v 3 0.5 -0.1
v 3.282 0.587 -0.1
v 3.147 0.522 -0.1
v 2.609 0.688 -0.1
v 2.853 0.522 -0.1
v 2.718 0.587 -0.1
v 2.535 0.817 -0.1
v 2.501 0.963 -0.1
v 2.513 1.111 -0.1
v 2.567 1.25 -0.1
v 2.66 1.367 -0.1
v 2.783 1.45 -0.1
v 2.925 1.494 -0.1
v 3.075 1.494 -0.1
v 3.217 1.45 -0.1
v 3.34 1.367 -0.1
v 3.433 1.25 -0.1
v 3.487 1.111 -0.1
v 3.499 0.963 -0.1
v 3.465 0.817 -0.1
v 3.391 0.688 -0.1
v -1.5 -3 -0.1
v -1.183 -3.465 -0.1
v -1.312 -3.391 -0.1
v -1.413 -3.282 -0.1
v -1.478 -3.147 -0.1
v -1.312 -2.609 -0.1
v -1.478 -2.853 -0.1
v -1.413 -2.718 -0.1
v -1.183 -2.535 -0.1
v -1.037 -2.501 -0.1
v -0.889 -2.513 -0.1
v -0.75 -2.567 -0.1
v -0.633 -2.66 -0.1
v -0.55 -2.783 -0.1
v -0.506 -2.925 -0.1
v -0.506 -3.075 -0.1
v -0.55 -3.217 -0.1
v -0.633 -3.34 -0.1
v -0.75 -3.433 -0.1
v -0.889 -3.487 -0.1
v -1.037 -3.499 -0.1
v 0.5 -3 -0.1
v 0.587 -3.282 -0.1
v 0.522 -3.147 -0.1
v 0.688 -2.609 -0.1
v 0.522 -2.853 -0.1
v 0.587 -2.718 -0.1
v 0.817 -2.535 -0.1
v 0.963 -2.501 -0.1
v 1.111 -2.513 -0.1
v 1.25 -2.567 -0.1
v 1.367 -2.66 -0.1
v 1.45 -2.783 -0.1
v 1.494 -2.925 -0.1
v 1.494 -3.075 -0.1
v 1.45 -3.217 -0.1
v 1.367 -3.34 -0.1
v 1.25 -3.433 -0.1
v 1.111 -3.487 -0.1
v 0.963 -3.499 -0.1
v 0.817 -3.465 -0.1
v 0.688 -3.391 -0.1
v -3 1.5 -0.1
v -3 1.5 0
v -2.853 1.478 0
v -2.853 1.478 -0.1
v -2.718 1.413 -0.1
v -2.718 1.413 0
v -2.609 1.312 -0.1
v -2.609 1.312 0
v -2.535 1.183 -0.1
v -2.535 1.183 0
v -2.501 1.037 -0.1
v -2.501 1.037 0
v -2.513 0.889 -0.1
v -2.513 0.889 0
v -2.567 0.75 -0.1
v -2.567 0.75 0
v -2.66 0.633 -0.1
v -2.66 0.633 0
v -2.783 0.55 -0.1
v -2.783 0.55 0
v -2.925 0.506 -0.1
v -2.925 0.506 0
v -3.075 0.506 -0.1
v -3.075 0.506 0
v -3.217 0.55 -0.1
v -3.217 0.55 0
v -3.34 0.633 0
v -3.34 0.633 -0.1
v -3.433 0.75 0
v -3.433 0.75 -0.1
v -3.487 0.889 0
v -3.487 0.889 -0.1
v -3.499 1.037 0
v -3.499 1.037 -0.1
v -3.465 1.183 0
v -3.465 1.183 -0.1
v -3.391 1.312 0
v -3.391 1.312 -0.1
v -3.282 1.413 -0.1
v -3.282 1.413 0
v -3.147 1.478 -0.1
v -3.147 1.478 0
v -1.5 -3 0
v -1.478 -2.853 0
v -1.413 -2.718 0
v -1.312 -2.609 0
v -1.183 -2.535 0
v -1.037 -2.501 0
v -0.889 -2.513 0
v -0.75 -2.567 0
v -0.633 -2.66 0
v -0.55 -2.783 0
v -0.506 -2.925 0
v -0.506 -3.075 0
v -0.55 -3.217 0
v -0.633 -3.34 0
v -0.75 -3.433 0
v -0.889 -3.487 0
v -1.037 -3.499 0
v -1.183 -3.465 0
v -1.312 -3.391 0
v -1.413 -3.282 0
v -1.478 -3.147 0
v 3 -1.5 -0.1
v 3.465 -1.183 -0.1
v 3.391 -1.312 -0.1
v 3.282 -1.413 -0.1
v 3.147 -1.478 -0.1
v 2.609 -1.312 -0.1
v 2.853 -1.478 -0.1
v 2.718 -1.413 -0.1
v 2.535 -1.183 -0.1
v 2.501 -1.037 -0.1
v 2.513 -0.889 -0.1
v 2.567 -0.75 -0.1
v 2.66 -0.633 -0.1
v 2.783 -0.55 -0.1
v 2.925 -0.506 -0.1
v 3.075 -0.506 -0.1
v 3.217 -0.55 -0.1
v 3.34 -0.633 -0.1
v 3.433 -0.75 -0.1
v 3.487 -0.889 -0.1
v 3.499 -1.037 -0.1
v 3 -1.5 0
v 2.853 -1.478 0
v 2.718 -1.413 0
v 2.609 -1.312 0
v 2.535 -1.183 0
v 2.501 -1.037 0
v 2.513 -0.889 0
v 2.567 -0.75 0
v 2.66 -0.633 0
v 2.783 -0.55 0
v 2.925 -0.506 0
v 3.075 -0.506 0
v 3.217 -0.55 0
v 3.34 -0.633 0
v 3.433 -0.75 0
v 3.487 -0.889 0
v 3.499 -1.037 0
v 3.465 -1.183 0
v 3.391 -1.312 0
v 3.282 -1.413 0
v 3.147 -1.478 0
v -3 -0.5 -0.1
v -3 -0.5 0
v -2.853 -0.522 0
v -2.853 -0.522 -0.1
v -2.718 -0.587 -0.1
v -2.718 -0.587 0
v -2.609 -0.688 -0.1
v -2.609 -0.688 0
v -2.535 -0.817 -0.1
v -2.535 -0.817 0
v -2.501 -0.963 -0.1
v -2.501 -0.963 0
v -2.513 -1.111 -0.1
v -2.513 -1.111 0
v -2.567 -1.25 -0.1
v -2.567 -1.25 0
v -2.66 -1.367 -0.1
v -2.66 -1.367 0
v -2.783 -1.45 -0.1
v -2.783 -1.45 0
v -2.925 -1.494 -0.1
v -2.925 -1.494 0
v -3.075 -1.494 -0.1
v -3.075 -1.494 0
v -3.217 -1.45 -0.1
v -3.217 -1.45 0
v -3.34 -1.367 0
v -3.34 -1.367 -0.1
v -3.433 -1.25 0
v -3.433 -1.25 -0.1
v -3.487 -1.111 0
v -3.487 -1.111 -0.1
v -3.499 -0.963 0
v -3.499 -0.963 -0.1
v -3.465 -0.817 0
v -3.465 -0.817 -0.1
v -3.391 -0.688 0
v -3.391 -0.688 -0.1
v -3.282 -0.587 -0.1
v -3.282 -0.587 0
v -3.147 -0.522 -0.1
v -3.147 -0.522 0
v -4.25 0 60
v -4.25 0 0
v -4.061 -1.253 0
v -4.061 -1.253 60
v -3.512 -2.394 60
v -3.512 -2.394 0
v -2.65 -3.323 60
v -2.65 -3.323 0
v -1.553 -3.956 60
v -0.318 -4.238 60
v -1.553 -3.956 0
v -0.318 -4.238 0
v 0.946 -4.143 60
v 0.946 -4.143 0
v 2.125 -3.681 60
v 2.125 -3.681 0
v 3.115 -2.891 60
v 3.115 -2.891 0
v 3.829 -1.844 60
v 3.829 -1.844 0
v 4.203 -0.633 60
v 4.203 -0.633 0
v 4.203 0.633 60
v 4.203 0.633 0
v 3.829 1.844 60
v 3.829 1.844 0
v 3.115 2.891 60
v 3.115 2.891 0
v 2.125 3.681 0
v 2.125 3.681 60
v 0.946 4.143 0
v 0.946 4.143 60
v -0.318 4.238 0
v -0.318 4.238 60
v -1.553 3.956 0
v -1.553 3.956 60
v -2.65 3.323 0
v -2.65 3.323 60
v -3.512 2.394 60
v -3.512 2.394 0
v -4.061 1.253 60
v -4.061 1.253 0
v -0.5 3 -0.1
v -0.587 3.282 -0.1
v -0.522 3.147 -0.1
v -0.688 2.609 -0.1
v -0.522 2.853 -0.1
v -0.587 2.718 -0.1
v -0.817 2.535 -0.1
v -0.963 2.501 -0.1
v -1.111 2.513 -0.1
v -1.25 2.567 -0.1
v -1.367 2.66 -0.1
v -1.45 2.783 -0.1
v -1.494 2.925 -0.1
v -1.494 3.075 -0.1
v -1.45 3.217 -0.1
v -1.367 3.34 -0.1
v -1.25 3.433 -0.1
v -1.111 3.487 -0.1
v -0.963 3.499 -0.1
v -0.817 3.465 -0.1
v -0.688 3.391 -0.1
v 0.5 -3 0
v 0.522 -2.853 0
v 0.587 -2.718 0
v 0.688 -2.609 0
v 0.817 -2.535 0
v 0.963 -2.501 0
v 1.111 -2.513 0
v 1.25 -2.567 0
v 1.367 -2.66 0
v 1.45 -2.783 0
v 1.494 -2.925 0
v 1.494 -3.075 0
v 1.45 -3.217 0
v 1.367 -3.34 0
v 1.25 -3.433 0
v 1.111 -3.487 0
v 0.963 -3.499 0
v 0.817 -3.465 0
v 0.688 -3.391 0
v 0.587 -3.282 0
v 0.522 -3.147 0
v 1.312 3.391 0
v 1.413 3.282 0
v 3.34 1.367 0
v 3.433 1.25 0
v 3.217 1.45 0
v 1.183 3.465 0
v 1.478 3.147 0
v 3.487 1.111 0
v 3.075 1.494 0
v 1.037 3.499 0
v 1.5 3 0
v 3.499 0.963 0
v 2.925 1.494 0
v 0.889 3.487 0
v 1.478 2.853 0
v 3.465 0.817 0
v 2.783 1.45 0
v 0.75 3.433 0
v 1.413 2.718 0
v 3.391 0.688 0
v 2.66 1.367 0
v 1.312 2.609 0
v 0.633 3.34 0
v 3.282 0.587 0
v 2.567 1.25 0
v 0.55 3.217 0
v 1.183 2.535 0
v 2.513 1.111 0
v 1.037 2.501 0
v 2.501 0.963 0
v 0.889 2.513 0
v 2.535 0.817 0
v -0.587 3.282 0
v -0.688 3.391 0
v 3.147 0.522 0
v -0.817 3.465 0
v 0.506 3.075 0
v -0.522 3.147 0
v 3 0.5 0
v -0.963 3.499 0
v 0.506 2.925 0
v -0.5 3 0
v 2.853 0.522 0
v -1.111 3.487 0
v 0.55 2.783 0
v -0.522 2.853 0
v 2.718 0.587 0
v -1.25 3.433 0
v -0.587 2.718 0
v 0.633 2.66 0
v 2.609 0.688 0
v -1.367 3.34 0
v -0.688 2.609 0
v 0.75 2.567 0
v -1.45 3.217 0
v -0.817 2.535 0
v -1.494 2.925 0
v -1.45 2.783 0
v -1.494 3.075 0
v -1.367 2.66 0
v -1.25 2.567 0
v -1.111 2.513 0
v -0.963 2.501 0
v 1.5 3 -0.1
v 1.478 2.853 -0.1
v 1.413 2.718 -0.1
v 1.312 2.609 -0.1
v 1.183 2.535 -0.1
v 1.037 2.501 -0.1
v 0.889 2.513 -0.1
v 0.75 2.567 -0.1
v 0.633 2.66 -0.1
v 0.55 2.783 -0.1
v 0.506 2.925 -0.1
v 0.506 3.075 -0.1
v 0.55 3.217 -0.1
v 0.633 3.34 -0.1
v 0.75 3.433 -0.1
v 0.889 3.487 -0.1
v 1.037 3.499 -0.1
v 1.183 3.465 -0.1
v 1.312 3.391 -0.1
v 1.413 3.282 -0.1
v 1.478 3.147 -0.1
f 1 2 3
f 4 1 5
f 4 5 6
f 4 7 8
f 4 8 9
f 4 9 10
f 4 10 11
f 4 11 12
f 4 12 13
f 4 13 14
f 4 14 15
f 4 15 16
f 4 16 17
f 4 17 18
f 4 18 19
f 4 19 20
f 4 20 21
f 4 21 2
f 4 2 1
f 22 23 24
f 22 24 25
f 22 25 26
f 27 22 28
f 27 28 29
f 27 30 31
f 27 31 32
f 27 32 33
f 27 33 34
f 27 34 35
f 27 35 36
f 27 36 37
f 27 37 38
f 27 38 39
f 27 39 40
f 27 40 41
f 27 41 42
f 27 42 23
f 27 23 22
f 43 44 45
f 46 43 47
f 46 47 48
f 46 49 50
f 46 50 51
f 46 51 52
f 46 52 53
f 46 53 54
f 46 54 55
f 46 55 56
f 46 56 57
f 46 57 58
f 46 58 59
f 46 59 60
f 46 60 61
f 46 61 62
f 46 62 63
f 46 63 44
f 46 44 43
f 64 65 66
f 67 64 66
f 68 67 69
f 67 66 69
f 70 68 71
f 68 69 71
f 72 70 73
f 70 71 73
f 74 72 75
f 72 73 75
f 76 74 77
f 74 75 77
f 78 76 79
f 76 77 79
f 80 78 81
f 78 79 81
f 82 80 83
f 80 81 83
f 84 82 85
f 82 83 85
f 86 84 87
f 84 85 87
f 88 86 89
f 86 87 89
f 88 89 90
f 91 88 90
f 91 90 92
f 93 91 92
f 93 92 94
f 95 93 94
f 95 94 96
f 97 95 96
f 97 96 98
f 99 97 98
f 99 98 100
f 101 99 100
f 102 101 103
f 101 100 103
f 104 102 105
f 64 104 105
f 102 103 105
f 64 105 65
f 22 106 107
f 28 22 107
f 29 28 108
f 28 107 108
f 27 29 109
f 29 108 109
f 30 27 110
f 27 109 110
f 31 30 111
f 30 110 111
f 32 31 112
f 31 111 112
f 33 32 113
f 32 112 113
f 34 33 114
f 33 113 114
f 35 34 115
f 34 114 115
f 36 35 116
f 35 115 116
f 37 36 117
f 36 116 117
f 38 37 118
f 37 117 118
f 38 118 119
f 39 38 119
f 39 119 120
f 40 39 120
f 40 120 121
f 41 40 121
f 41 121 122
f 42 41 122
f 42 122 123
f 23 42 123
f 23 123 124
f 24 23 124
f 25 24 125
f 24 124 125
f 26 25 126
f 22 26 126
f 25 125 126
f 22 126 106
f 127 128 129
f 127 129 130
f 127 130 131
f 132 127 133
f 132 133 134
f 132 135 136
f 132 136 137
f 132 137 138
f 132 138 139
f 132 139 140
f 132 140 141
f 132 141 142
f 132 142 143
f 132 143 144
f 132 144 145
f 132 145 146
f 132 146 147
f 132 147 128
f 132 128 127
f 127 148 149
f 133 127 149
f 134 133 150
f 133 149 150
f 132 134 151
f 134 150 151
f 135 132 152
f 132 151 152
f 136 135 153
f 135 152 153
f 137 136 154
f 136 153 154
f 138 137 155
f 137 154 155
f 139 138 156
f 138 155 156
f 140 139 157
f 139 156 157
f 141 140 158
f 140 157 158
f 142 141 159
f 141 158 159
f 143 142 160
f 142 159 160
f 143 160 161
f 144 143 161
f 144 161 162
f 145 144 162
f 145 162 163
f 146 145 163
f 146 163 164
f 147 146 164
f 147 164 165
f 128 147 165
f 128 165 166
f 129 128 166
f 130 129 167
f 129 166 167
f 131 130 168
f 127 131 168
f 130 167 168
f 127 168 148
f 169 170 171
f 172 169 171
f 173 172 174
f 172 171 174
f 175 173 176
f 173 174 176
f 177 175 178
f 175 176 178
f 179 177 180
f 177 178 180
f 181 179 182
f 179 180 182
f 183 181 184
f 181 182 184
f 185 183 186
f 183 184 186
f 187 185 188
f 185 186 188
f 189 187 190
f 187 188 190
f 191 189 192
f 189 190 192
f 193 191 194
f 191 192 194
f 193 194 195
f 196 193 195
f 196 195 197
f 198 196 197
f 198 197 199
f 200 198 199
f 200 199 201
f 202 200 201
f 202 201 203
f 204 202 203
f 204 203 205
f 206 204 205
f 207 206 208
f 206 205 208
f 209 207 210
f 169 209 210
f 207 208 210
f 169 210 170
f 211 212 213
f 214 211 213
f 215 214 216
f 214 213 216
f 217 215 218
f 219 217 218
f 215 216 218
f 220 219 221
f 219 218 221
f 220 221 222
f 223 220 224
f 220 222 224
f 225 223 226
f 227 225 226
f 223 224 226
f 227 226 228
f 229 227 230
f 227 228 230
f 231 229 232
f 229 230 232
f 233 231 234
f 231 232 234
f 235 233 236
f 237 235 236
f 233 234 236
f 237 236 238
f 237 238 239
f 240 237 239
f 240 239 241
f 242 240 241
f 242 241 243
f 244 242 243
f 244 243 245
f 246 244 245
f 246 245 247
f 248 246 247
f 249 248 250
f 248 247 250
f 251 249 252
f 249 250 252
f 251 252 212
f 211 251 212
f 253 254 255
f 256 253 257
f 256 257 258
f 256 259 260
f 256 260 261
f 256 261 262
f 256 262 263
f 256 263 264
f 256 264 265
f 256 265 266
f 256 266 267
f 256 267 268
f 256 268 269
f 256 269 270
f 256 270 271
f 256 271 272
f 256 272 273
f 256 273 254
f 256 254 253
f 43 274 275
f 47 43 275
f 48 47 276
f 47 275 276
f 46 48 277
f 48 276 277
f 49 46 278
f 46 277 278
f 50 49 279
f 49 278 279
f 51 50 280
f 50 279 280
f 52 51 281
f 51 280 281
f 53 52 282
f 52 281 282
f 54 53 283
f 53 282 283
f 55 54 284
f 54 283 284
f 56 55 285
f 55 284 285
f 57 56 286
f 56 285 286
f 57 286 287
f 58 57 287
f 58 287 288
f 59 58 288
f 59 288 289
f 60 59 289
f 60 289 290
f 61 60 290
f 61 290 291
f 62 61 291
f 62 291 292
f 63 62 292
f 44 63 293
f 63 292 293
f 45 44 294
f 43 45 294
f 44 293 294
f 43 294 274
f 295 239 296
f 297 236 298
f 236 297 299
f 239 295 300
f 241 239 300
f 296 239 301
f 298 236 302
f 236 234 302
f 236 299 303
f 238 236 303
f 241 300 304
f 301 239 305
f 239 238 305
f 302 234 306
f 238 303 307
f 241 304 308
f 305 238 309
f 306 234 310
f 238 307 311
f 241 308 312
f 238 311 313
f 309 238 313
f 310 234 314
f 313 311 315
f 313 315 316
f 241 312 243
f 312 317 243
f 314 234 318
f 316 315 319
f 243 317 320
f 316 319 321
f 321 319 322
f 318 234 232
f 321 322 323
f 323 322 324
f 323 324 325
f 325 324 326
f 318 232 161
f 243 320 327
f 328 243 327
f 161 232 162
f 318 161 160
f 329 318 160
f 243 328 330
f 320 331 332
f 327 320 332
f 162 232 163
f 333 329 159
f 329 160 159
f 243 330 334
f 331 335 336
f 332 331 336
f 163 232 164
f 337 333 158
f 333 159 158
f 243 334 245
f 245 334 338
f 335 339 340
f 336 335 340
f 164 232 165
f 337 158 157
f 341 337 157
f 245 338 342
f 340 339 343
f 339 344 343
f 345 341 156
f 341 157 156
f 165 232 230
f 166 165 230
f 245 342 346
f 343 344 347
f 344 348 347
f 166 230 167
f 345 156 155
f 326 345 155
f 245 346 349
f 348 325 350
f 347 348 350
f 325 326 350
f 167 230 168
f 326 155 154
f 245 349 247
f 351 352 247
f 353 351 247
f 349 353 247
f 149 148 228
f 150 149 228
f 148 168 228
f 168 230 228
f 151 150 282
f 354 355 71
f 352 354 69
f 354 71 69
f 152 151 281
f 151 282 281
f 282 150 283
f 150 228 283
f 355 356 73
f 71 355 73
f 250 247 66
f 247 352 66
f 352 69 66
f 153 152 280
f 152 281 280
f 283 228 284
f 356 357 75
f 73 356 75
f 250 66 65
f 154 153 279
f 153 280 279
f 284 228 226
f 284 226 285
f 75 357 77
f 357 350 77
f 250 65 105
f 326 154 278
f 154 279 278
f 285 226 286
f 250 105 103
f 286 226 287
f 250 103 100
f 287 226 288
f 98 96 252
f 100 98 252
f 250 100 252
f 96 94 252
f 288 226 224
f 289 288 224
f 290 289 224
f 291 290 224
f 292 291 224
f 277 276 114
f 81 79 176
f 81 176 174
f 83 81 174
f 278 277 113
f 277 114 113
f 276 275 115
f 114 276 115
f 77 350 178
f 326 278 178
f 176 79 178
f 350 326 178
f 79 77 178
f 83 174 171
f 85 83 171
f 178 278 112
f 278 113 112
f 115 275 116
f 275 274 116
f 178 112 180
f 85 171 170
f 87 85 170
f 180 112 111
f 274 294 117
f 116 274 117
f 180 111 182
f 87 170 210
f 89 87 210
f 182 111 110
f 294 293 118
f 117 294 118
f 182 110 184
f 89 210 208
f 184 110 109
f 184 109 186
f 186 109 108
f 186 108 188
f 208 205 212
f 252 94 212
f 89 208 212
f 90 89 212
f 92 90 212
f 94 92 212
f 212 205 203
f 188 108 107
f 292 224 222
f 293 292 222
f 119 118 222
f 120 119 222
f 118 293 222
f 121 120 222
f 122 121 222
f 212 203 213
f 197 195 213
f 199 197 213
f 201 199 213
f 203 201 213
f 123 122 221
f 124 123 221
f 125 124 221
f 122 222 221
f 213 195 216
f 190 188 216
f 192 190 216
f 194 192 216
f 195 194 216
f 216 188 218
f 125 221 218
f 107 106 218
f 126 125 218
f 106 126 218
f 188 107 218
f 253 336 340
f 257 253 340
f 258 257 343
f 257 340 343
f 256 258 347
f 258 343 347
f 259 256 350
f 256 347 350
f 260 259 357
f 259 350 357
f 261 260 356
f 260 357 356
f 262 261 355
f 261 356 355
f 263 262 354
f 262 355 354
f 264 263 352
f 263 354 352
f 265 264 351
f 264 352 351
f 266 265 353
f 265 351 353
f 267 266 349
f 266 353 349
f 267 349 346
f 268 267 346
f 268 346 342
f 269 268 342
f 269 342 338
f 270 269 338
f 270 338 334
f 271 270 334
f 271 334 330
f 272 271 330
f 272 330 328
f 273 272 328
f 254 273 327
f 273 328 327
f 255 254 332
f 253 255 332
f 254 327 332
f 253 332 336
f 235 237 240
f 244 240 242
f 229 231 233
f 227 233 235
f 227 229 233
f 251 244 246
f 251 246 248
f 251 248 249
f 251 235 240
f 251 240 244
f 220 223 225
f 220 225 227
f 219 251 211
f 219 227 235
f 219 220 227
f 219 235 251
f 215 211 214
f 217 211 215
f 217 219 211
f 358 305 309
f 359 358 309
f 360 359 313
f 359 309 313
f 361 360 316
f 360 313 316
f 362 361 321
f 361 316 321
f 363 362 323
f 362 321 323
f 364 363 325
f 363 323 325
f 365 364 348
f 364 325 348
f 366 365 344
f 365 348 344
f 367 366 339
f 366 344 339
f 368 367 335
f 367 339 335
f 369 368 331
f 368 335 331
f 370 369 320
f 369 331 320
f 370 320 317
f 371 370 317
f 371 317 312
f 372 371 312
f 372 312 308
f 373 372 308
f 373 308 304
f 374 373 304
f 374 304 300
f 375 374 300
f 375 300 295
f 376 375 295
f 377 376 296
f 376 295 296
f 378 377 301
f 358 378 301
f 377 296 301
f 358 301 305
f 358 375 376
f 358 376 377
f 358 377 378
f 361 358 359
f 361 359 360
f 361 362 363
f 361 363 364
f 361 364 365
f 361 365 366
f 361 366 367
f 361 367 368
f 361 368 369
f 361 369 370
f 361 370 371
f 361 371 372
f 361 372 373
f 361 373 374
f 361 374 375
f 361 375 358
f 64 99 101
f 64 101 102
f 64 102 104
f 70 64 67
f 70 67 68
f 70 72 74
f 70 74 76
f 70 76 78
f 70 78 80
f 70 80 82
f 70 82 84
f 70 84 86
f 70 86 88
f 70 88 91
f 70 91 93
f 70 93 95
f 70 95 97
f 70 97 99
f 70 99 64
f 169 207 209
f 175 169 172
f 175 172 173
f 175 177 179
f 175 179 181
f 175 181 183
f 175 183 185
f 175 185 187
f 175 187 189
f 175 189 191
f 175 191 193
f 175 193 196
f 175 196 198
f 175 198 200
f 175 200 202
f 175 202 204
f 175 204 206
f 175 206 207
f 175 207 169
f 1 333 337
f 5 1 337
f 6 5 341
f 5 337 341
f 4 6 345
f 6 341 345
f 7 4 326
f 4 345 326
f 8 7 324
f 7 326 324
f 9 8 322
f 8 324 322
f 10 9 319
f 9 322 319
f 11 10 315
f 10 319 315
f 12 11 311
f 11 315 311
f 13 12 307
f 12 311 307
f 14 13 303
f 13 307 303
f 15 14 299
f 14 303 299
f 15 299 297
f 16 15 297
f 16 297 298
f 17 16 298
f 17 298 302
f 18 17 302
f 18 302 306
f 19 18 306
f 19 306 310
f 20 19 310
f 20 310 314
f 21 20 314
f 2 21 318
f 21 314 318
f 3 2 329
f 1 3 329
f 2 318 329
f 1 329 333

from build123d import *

# Parameters (mm, degrees)
SKETCH1_R           = 4.25
BOSS_EXTRUDE1_DEPTH = 60
SKETCH2_R           = 0.5
BOSS_EXTRUDE2_DEPTH = 0.1
CIRPATTERN1_COUNT   = 4


with BuildPart() as part:
    # Sketch1 → Boss-Extrude1 (new body)
    with BuildSketch(Plane.XY):
        with Locations(Location((0, 0, 0), (0, 0, 180))):
            Circle(SKETCH1_R)
    extrude(amount=BOSS_EXTRUDE1_DEPTH)

    # Sketch2 → Boss-Extrude2 (add)
    with BuildSketch(Plane(origin=(0, 0, 0), x_dir=(-1, 0, 0), z_dir=(0, 0, -1))):
        with Locations(Location((-1, 3, 0), (0, 0, 180))):
            Circle(SKETCH2_R)
        with Locations(Location((1, 3, 0), (0, 0, 180))):
            Circle(SKETCH2_R)
    boss_extrude2 = extrude(amount=BOSS_EXTRUDE2_DEPTH)

    # CirPattern1: Boss-Extrude2 ×4 about axis
    cirpattern1_axis = Axis((0, 0, 0), (0, 0, 1))
    for i in range(1, CIRPATTERN1_COUNT):
        add(boss_extrude2.rotate(cirpattern1_axis, i * 360 / CIRPATTERN1_COUNT))


solid = part.part
